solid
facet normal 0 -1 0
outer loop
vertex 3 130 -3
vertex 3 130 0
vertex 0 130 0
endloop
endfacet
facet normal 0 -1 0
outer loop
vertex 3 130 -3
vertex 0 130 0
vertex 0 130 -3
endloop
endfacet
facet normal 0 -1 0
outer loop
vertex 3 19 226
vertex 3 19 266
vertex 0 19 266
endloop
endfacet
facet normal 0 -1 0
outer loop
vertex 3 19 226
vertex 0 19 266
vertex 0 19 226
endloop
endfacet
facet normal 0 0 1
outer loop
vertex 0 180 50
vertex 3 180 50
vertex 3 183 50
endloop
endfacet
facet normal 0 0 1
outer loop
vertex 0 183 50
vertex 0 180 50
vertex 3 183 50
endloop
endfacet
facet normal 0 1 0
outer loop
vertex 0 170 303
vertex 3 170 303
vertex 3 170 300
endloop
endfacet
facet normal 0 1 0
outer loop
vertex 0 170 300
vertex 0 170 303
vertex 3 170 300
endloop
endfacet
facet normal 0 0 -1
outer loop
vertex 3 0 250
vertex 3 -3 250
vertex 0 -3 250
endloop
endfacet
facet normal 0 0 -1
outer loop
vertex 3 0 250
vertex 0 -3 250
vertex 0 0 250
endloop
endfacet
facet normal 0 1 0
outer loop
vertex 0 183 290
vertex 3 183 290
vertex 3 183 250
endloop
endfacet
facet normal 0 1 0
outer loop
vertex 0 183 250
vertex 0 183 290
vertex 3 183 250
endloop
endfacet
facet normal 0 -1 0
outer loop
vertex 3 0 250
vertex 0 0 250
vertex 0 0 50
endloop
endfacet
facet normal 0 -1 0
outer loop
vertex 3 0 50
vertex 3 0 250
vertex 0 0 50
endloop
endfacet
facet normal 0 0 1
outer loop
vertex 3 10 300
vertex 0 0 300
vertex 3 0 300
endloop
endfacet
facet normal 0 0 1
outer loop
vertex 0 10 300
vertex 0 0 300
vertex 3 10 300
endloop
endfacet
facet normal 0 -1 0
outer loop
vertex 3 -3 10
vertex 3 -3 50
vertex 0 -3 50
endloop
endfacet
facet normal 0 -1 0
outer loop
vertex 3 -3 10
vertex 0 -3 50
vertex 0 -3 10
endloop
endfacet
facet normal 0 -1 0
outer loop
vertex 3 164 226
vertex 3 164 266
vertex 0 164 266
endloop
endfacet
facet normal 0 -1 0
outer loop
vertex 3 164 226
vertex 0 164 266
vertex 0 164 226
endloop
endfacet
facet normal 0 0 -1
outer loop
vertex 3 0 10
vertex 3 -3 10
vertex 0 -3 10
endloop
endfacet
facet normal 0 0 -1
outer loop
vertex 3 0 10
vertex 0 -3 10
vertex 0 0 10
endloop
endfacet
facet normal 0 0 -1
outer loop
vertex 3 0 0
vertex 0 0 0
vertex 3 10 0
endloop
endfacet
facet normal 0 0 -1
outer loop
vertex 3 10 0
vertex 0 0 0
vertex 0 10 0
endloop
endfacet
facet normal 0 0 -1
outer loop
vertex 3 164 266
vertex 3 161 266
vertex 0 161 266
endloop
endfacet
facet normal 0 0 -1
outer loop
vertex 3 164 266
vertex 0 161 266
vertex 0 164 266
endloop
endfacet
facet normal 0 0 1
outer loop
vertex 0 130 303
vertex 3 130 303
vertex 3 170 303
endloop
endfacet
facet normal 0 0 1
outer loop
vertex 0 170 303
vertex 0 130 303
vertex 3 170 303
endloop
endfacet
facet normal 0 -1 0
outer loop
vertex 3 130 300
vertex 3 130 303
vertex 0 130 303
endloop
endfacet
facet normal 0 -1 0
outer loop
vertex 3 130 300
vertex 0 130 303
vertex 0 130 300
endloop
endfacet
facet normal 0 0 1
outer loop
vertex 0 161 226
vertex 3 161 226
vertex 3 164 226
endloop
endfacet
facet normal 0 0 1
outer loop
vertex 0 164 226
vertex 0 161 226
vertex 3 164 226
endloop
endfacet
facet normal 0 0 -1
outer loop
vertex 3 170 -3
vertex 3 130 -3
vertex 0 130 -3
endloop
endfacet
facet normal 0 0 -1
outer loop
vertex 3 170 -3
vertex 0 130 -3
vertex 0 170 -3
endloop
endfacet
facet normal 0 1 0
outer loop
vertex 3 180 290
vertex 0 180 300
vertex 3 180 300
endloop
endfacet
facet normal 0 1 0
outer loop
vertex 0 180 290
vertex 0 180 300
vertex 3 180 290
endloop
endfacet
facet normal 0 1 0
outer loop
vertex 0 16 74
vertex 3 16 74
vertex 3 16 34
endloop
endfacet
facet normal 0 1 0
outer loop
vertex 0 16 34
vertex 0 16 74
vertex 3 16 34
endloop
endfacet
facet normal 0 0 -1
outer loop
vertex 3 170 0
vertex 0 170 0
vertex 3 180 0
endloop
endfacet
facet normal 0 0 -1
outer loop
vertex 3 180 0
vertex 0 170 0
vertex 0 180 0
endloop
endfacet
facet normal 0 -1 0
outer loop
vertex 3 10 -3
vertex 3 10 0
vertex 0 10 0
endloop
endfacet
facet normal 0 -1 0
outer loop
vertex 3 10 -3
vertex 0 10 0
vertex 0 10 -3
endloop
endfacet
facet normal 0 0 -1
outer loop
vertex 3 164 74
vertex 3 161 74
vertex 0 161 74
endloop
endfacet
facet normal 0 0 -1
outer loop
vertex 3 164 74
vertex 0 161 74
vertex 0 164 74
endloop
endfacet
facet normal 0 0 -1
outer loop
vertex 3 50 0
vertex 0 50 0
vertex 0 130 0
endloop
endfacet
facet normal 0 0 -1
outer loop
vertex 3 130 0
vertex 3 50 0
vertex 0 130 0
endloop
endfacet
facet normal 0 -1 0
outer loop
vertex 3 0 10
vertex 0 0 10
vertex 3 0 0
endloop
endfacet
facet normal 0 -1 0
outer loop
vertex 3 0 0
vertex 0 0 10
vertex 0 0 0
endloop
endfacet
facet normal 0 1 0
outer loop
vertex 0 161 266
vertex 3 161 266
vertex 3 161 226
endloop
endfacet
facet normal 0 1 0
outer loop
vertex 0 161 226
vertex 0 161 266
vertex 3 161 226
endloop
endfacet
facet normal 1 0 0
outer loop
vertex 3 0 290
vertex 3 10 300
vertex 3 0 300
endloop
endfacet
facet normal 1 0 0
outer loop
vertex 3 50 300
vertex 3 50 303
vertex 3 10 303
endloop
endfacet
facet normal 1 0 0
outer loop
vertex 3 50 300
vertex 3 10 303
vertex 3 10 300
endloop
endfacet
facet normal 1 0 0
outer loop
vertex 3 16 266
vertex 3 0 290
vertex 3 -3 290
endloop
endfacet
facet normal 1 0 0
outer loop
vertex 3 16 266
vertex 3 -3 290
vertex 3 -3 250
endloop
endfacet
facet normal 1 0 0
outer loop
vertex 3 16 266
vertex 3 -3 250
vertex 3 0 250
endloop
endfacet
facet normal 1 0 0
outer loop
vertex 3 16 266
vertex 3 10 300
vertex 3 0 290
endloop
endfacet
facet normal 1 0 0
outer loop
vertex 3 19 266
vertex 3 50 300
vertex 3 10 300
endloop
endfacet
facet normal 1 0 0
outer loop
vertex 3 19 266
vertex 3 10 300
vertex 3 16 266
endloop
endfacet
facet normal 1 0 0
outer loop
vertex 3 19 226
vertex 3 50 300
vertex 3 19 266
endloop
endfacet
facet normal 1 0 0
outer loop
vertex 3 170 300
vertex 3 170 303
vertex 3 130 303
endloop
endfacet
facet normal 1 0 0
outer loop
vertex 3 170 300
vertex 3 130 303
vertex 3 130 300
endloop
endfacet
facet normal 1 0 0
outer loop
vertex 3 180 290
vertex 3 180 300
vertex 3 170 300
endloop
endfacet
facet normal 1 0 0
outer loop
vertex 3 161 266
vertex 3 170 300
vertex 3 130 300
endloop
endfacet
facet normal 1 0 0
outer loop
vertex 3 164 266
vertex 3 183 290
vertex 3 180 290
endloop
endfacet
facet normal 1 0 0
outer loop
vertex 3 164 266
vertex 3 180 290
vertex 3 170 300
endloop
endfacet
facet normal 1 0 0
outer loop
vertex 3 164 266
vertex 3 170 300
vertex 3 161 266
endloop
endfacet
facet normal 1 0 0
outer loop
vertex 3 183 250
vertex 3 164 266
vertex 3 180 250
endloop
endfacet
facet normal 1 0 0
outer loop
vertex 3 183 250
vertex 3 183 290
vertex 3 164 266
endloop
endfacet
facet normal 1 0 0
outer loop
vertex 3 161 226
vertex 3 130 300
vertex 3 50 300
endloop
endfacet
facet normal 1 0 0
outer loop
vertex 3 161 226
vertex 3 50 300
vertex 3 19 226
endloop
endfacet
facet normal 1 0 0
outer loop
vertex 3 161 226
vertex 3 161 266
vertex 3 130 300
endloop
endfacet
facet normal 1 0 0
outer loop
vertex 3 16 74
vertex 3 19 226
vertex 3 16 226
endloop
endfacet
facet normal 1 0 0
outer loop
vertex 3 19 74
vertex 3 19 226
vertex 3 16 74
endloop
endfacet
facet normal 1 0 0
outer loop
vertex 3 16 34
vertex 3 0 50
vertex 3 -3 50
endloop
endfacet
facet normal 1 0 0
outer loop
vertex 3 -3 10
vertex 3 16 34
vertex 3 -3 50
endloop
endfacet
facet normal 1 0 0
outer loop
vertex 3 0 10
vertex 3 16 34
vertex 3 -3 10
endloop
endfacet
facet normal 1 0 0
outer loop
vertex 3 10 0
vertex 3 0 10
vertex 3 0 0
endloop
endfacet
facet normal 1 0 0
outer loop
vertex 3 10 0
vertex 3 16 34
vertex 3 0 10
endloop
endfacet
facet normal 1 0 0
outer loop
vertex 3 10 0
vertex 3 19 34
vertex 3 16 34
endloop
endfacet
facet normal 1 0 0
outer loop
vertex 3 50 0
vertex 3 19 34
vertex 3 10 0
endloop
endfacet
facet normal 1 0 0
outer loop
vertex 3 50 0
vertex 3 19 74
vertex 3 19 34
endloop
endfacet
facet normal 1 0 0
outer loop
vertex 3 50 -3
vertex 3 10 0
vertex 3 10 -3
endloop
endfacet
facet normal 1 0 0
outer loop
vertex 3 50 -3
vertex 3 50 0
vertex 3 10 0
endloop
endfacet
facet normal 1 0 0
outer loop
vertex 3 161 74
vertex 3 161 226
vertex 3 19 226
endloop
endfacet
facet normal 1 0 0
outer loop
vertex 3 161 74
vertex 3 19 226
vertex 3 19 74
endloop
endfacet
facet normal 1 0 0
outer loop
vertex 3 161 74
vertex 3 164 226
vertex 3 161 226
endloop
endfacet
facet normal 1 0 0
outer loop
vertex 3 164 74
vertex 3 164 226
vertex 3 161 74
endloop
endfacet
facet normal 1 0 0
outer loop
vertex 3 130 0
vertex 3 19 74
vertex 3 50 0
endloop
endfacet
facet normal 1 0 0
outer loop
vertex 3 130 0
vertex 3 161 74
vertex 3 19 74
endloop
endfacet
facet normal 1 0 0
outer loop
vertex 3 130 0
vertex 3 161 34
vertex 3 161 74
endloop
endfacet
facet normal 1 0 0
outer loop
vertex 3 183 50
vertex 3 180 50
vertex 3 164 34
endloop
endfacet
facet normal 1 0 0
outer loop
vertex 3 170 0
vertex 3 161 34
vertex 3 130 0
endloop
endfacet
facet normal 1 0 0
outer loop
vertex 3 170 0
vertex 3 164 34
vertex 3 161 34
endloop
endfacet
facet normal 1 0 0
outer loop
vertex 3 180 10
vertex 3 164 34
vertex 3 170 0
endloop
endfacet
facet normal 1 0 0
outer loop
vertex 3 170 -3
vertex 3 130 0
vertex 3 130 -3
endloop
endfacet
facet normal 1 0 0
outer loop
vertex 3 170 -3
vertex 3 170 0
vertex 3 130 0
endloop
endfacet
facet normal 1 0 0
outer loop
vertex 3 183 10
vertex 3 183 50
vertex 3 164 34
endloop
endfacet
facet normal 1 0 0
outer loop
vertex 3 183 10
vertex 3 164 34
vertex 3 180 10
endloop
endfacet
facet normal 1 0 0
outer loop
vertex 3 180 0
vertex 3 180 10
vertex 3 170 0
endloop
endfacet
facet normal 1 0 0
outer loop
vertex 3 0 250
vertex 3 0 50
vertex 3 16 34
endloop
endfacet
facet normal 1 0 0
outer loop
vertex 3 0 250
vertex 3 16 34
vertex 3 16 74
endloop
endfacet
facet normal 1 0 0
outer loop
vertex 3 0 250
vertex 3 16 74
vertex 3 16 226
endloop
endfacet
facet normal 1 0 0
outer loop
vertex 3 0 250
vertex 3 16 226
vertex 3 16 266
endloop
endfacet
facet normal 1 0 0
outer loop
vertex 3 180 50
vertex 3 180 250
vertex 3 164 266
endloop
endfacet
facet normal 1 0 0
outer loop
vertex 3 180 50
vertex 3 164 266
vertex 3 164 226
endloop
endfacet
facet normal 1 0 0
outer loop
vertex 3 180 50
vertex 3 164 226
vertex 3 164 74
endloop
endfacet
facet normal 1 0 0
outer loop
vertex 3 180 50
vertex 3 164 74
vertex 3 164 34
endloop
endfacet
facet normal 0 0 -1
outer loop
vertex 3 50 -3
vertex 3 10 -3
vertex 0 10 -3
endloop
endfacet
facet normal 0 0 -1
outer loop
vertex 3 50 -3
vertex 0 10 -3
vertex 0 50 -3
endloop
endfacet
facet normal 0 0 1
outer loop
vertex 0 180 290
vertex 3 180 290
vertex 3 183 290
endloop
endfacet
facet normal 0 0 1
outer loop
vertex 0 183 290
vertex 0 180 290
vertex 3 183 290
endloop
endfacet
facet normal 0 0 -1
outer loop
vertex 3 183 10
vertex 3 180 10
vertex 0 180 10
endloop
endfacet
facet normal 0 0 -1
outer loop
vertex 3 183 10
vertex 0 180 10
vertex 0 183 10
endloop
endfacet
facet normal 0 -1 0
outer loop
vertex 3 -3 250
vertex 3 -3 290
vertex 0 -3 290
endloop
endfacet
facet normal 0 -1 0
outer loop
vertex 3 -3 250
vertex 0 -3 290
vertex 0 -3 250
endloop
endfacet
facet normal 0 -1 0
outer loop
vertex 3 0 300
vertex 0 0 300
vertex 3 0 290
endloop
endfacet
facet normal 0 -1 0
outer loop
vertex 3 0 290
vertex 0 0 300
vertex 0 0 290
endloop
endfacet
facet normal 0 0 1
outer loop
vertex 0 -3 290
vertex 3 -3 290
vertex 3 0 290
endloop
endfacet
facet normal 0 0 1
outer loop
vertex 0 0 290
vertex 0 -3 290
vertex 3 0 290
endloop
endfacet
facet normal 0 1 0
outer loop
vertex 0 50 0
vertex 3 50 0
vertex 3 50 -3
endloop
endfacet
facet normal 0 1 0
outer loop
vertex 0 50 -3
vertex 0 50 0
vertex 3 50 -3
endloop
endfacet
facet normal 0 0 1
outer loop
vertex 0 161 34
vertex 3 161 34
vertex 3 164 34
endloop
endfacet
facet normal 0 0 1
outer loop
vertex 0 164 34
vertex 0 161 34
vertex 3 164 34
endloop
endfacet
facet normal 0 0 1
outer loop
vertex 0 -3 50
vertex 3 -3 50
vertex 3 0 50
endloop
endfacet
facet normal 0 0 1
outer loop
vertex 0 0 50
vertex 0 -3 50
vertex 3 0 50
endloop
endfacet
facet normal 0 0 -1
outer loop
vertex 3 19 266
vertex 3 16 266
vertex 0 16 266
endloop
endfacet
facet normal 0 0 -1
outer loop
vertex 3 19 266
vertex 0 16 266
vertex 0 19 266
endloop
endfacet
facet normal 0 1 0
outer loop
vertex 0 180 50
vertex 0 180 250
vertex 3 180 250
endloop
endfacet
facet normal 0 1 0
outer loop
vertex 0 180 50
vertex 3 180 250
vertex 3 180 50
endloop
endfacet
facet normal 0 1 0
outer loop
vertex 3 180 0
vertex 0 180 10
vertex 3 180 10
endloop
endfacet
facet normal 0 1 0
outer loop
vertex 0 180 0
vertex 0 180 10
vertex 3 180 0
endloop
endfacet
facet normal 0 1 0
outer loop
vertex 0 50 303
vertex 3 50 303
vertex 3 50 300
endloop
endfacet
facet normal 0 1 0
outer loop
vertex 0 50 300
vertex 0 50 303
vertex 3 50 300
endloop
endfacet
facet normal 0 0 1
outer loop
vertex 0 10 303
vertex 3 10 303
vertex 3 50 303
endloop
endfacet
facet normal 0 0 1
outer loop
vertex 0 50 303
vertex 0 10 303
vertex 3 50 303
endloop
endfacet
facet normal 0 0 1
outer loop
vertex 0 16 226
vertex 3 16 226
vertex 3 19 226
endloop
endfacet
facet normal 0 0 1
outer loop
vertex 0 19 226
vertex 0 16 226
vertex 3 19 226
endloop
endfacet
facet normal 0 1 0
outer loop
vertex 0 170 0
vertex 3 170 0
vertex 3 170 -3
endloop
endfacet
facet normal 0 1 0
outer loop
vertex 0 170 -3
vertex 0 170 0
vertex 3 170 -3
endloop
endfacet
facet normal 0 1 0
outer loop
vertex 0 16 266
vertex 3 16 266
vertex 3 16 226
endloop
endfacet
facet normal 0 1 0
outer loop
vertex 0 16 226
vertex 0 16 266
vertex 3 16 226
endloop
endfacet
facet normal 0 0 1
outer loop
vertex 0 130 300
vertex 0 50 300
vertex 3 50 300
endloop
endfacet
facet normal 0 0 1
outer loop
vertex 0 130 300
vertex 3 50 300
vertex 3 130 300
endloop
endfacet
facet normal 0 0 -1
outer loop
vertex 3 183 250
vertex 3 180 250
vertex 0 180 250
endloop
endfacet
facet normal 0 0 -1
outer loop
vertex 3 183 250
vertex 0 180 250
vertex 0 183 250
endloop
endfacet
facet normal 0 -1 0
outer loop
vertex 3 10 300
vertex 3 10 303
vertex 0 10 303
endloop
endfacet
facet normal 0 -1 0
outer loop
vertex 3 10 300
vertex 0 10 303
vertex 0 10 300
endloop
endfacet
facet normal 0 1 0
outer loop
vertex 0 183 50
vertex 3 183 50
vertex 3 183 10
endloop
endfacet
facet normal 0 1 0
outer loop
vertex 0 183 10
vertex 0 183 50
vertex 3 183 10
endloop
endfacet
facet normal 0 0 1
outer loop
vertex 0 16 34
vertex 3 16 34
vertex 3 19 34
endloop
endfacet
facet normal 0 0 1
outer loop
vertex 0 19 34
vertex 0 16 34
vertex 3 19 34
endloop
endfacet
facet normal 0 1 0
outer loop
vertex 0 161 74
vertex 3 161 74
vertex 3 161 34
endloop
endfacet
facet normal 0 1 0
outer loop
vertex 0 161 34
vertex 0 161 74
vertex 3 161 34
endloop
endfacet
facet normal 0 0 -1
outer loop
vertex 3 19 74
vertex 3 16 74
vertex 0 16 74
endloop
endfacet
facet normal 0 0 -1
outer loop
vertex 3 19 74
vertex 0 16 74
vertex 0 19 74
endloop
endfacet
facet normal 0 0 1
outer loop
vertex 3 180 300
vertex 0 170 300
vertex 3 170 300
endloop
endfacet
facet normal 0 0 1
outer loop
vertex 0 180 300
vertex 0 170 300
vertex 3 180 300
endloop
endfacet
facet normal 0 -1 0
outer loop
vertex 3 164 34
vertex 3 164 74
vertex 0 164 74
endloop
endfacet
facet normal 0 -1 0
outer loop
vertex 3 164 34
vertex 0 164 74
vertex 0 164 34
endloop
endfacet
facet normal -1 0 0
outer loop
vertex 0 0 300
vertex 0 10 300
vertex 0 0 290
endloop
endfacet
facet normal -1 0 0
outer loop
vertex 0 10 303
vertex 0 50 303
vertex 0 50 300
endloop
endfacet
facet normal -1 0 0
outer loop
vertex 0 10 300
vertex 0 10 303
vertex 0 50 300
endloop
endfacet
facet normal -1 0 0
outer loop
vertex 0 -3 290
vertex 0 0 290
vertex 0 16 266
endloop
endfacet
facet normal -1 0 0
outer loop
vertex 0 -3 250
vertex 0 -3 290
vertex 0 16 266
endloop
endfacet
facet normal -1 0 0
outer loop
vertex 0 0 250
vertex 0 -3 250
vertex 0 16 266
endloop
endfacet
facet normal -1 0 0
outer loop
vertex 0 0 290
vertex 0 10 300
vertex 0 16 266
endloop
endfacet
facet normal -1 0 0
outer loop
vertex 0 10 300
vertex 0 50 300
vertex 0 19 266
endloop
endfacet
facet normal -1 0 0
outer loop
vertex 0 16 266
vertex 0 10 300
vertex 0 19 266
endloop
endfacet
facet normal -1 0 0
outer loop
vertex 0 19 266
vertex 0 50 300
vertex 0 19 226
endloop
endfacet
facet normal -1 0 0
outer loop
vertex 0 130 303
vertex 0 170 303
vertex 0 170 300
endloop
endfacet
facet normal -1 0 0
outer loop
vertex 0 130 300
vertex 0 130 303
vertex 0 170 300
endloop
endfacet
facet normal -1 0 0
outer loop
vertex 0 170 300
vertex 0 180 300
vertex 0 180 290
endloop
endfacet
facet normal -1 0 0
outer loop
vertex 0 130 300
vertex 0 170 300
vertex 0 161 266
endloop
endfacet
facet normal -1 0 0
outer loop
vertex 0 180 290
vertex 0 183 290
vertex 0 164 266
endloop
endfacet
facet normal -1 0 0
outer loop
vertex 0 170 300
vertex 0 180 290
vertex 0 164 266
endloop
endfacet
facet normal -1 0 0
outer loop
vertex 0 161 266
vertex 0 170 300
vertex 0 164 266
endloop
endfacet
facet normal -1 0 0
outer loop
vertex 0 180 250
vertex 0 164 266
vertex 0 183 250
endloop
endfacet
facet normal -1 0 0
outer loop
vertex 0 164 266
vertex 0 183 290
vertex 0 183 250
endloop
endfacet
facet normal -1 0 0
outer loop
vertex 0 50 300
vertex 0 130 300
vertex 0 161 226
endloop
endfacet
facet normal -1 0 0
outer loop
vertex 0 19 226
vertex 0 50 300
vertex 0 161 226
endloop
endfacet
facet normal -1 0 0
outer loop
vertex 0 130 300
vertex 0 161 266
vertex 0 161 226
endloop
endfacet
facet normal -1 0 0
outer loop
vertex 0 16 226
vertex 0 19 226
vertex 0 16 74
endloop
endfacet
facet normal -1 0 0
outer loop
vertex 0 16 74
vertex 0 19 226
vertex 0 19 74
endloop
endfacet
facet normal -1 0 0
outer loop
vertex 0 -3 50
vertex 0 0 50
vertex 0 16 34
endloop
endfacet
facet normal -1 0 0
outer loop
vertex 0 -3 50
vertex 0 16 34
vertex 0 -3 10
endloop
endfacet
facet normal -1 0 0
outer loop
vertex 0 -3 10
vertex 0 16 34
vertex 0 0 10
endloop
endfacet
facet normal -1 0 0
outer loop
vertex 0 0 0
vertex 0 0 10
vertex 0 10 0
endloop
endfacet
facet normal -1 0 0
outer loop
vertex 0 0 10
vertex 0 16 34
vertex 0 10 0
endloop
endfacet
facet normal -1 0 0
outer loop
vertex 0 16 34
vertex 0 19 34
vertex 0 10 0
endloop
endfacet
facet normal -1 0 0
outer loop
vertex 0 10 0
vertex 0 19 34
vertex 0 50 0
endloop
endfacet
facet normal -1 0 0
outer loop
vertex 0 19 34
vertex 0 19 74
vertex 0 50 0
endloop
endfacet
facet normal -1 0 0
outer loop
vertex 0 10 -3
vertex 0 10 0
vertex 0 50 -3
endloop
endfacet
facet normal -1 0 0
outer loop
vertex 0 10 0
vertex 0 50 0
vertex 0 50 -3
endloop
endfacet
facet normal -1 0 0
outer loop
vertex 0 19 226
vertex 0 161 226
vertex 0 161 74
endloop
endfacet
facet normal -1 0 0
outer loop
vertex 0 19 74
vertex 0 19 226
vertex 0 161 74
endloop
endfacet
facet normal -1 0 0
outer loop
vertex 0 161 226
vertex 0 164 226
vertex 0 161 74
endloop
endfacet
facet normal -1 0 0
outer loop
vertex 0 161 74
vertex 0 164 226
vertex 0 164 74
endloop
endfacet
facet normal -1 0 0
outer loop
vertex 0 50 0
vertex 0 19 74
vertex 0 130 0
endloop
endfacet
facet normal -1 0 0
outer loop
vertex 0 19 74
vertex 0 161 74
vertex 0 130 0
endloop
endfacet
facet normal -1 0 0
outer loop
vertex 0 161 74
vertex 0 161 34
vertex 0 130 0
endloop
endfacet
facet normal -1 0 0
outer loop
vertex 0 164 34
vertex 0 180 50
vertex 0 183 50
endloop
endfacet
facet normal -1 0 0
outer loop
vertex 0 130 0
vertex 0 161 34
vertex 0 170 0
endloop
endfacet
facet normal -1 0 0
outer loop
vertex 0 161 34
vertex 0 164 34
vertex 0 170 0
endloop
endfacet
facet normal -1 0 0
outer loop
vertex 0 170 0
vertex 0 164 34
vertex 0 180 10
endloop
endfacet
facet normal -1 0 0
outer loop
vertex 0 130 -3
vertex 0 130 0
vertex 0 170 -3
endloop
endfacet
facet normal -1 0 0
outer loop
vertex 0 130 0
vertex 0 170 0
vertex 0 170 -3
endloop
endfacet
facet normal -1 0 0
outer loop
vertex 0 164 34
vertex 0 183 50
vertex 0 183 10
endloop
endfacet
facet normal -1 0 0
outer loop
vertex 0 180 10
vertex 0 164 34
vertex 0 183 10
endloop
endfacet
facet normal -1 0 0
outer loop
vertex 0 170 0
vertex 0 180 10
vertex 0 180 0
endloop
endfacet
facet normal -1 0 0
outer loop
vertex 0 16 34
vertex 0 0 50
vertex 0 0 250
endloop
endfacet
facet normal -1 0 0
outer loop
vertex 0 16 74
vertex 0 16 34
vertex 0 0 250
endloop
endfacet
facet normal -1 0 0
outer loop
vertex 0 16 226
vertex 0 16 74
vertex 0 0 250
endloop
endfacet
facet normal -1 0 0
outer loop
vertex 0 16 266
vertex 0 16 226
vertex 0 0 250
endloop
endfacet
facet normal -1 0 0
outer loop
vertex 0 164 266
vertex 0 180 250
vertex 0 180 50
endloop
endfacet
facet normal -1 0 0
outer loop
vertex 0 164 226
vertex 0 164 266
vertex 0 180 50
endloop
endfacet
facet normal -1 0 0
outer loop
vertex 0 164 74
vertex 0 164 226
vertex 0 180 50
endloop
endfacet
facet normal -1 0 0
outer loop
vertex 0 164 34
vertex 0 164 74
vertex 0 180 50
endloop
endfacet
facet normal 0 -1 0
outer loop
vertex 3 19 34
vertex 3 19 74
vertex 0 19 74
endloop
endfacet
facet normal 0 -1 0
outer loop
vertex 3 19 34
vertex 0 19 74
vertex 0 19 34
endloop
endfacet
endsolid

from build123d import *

# Parameters (mm, degrees)
SKETCH1_W           = 300
SKETCH1_H           = 180
BOSS_EXTRUDE1_DEPTH = 3
SKETCH2_W           = 40
SKETCH2_H           = 3
SKETCH2_W_2         = 3
SKETCH2_H_2         = 40
BOSS_EXTRUDE2_DEPTH = 3
SKETCH3_W           = 40
SKETCH3_H           = 3
CUT_EXTRUDE1_DEPTH  = 354.987287907
SKETCH4_W           = 40
SKETCH4_H           = 3
CUT_EXTRUDE2_DEPTH  = 3
SKETCH5_W           = 40
SKETCH5_H           = 3
CUT_EXTRUDE3_DEPTH  = 3
SKETCH6_W           = 40
SKETCH6_H           = 3
CUT_EXTRUDE4_DEPTH  = 3


with BuildPart() as part:
    # Sketch1 → Boss-Extrude1 (new body)
    with BuildSketch(Plane(origin=(0, 0, 0), x_dir=(0, 0, -1), z_dir=(1, 0, 0))):
        with Locations((-150, 90)):
            Rectangle(SKETCH1_W, SKETCH1_H)
    extrude(amount=BOSS_EXTRUDE1_DEPTH)

    # Sketch2 → Boss-Extrude2 (add)
    with BuildSketch(Plane(origin=(3, 0, 0), x_dir=(0, 0, -1), z_dir=(1, 0, 0))):
        with Locations((-270, 181.5)):
            Rectangle(SKETCH2_W, SKETCH2_H)
        with Locations((-30, 181.5)):
            Rectangle(SKETCH2_W, SKETCH2_H)
        with Locations((1.5, 150)):
            Rectangle(SKETCH2_W_2, SKETCH2_H_2)
        with Locations((1.5, 30)):
            Rectangle(SKETCH2_W_2, SKETCH2_H_2)
        with Locations((-30, -1.5)):
            Rectangle(SKETCH2_W, SKETCH2_H)
        with Locations((-270, -1.5)):
            Rectangle(SKETCH2_W, SKETCH2_H)
        with Locations((-301.5, 150)):
            Rectangle(SKETCH2_W_2, SKETCH2_H_2)
        with Locations((-301.5, 30)):
            Rectangle(SKETCH2_W_2, SKETCH2_H_2)
    extrude(amount=-BOSS_EXTRUDE2_DEPTH)

    # Sketch3 → Cut-Extrude1 (cut, through all)
    with BuildSketch(Plane(origin=(3, 0, 0), x_dir=(0, 0, -1), z_dir=(1, 0, 0))):
        with Locations((-246, 162.5)):
            Rectangle(SKETCH3_W, SKETCH3_H)
    extrude(amount=-CUT_EXTRUDE1_DEPTH, mode=Mode.SUBTRACT)

    # Sketch4 → Cut-Extrude2 (cut)
    with BuildSketch(Plane(origin=(3, 0, 0), x_dir=(0, 0, -1), z_dir=(1, 0, 0))):
        with Locations((-54, 162.5)):
            Rectangle(SKETCH4_W, SKETCH4_H)
    extrude(amount=-CUT_EXTRUDE2_DEPTH, mode=Mode.SUBTRACT)

    # Sketch5 → Cut-Extrude3 (cut)
    with BuildSketch(Plane(origin=(3, 0, 0), x_dir=(0, 0, -1), z_dir=(1, 0, 0))):
        with Locations((-246, 17.5)):
            Rectangle(SKETCH5_W, SKETCH5_H)
    extrude(amount=-CUT_EXTRUDE3_DEPTH, mode=Mode.SUBTRACT)

    # Sketch6 → Cut-Extrude4 (cut)
    with BuildSketch(Plane(origin=(3, 0, 0), x_dir=(0, 0, -1), z_dir=(1, 0, 0))):
        with Locations((-54, 17.5)):
            Rectangle(SKETCH6_W, SKETCH6_H)
    extrude(amount=-CUT_EXTRUDE4_DEPTH, mode=Mode.SUBTRACT)


solid = part.part
